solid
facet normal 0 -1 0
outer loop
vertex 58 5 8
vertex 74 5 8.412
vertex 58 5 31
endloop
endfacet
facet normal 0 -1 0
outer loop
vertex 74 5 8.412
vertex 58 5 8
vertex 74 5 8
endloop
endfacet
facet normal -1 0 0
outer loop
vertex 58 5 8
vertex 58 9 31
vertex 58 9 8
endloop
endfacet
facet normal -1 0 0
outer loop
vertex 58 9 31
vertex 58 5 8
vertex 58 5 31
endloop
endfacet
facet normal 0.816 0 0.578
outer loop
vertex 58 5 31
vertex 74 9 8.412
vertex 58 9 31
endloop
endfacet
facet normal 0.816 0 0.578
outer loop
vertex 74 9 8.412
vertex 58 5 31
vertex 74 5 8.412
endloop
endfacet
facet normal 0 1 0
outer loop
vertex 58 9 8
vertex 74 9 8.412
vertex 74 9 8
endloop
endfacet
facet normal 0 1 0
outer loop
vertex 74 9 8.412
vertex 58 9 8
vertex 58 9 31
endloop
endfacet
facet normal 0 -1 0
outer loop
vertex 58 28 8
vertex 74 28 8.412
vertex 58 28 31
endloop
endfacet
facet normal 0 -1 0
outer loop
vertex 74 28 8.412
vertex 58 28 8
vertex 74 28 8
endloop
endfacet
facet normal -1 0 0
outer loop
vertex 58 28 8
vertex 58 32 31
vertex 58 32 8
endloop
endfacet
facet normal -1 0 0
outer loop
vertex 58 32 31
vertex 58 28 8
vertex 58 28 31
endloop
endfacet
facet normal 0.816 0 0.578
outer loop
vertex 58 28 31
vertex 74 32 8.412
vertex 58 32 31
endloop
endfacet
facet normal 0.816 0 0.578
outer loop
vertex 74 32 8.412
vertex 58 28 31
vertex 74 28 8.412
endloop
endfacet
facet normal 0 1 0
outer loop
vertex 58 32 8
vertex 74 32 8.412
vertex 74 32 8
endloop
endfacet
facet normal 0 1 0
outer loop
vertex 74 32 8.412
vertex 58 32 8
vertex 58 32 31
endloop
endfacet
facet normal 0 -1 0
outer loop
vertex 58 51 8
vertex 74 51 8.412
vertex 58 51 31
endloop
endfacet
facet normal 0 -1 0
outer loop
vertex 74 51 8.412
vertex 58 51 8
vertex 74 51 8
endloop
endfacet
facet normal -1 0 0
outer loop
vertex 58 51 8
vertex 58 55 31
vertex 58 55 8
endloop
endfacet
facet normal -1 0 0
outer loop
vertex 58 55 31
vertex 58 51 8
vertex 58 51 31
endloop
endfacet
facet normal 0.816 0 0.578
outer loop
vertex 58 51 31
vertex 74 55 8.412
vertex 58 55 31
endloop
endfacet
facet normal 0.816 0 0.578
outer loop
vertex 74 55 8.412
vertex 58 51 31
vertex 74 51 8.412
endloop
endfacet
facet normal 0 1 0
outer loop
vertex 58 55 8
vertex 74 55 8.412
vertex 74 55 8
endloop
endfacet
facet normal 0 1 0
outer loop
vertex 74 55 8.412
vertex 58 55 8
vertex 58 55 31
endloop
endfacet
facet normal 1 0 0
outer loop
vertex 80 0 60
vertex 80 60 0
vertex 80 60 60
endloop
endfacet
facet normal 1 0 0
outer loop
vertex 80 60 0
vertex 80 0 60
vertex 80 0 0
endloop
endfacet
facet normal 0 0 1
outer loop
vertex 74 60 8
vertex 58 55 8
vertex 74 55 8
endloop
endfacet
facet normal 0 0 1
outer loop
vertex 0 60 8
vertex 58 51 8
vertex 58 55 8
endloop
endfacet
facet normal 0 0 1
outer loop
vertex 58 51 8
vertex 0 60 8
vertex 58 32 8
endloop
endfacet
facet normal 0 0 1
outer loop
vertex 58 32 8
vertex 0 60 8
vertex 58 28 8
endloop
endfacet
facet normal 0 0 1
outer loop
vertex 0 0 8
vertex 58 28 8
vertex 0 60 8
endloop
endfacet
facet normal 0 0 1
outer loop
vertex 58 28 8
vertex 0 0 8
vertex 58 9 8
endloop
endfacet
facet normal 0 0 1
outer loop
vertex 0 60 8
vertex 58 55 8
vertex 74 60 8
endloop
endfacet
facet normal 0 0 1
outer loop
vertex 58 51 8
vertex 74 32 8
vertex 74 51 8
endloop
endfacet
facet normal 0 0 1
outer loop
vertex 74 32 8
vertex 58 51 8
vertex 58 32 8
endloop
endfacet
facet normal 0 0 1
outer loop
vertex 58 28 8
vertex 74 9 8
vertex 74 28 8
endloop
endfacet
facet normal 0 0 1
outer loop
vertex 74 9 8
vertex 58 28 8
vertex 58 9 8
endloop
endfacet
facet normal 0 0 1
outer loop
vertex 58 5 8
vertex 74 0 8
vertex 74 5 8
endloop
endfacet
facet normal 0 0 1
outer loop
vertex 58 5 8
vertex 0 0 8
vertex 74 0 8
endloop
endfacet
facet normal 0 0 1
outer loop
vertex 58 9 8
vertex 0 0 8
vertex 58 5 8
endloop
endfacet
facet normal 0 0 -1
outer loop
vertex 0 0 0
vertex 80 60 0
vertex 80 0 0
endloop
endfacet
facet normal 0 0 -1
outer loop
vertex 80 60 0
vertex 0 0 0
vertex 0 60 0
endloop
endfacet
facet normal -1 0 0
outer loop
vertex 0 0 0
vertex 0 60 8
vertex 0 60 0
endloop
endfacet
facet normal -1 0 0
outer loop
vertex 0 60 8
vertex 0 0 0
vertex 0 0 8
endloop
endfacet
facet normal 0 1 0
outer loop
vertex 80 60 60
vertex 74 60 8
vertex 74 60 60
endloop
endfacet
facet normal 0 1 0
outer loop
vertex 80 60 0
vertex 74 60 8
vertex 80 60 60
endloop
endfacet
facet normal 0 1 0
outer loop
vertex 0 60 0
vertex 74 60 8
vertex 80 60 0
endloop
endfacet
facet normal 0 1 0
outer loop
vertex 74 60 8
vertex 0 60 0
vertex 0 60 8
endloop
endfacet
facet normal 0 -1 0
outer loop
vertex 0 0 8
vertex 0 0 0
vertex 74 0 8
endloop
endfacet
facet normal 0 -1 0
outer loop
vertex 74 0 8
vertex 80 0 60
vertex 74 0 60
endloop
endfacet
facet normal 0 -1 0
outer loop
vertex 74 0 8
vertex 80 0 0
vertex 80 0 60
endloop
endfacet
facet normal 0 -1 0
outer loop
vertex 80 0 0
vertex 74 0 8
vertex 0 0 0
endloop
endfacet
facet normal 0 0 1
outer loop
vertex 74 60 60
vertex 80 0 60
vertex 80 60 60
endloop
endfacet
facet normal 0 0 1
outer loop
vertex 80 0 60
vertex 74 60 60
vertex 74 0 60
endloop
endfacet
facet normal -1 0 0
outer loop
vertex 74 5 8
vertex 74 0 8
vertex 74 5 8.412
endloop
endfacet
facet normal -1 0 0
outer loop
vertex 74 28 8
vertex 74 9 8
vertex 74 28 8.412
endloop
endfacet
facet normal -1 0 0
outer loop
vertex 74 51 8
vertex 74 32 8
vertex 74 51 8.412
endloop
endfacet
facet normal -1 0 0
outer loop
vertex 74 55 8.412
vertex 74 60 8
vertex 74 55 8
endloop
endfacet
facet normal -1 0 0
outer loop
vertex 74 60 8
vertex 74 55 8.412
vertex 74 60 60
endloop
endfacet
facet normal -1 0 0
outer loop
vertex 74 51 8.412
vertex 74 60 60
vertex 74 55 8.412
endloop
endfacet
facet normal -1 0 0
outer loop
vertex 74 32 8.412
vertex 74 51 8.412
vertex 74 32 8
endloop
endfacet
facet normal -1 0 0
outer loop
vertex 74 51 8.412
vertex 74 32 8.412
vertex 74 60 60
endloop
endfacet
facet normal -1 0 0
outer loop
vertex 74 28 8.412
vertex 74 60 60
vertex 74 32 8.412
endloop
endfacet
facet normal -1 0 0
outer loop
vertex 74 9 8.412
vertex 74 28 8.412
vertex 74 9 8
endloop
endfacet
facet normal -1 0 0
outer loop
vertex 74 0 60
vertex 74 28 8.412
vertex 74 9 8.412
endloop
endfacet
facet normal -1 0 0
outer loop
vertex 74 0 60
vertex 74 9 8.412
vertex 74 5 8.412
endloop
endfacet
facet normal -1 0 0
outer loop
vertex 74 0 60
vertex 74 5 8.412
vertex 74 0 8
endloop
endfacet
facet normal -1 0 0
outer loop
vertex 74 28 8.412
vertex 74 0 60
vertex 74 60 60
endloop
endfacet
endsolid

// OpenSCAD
$fn = 32;

// ----------------------------------------------------------------------
// Rib bracket: 3-gusset L bracket
// ----------------------------------------------------------------------

// --- parameters (mm) ---
base_l = 80;              // foot length, X
base_w = 60;              // foot width, Y
base_t = 8;               // foot thickness
plate_t = 6;              // upright plate thickness
plate_h = 60;             // overall height
gus_l = 16;               // gusset leg along the foot
gus_h = 24;               // gusset height
gus_t = 4;                // gusset thickness
gus_edge = 5;             // gusset margin from the foot edge
n_gus = 3;                // gusset count

gus_pitch = (base_w - 2 * gus_edge - gus_t) / (n_gus - 1);  // gusset pitch

union() {
  cube([base_l, base_w, base_t]);
  translate([base_l - plate_t, 0, base_t - 1])
    cube([plate_t, base_w, plate_h - base_t + 1]);
  for (i = [0 : n_gus - 1])
    translate([base_l - plate_t - gus_l, gus_edge + i * gus_pitch, base_t - 1])
      rotate([-90, 0, 0])
        linear_extrude(height = gus_t)
          polygon(points = [[0, 0], [gus_l + 1, 0], [0, -gus_h]]);
}
